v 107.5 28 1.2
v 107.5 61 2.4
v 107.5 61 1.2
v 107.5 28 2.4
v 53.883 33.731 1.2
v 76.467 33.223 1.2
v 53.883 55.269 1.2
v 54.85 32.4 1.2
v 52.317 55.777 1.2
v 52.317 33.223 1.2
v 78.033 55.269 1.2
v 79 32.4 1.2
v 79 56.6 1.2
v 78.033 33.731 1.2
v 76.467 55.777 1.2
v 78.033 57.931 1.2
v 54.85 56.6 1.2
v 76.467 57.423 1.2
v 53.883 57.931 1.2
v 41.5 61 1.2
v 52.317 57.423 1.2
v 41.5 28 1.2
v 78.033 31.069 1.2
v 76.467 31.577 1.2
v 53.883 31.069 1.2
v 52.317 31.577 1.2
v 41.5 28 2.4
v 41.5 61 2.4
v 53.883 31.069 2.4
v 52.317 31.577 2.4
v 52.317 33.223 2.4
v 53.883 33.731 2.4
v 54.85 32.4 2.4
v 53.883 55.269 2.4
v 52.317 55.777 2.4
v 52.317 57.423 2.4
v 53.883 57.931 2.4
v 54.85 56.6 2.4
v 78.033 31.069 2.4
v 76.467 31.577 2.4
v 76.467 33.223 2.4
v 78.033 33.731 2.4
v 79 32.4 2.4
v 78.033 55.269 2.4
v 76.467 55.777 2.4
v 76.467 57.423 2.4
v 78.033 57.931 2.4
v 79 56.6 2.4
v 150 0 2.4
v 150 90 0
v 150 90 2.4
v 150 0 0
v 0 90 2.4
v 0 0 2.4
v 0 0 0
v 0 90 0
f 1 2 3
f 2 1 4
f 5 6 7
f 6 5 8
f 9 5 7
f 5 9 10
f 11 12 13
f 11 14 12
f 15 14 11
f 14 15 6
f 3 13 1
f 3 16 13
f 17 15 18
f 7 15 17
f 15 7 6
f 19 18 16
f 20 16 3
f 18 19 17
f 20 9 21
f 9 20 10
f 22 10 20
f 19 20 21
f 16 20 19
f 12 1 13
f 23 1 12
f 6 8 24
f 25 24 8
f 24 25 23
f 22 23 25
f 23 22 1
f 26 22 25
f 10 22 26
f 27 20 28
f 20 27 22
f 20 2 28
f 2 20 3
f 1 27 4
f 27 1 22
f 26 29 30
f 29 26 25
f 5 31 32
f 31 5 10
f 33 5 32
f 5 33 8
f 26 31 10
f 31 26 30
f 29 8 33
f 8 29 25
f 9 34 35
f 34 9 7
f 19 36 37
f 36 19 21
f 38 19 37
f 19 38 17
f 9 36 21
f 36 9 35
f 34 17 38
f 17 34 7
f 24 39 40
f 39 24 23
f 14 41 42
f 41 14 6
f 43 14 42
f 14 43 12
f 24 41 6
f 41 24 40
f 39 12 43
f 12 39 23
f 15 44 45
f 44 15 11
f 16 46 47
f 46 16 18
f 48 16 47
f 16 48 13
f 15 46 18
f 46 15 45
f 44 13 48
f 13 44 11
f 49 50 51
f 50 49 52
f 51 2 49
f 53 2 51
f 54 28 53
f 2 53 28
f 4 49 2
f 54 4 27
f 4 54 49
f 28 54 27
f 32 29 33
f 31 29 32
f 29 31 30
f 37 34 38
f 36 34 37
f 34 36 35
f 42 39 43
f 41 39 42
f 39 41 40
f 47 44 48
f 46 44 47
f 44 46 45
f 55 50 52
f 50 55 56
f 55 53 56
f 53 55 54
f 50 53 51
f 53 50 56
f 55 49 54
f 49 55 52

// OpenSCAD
difference() {
    cube([150, 90, 2.4]);
    translate([150/2 - 66/2, 90/2 - 33/2, 1.2]) {
        difference() {
            translate([-0.5, -0.5, 0])
                cube([66, 33, 1.2 + 0.1]);

            translate([11.45, 3.9, 0])
                cylinder(h=1.3, r=1.4);
            
            translate([11.45, 28.10, 0])
                cylinder(h=1.3, r=1.4);
            
            translate([35.6, 3.9, 0])
                cylinder(h=1.3, r=1.4);
            
            translate([35.6, 28.10, 0])
                cylinder(h=1.3, r=1.4);
        }
    }
};
